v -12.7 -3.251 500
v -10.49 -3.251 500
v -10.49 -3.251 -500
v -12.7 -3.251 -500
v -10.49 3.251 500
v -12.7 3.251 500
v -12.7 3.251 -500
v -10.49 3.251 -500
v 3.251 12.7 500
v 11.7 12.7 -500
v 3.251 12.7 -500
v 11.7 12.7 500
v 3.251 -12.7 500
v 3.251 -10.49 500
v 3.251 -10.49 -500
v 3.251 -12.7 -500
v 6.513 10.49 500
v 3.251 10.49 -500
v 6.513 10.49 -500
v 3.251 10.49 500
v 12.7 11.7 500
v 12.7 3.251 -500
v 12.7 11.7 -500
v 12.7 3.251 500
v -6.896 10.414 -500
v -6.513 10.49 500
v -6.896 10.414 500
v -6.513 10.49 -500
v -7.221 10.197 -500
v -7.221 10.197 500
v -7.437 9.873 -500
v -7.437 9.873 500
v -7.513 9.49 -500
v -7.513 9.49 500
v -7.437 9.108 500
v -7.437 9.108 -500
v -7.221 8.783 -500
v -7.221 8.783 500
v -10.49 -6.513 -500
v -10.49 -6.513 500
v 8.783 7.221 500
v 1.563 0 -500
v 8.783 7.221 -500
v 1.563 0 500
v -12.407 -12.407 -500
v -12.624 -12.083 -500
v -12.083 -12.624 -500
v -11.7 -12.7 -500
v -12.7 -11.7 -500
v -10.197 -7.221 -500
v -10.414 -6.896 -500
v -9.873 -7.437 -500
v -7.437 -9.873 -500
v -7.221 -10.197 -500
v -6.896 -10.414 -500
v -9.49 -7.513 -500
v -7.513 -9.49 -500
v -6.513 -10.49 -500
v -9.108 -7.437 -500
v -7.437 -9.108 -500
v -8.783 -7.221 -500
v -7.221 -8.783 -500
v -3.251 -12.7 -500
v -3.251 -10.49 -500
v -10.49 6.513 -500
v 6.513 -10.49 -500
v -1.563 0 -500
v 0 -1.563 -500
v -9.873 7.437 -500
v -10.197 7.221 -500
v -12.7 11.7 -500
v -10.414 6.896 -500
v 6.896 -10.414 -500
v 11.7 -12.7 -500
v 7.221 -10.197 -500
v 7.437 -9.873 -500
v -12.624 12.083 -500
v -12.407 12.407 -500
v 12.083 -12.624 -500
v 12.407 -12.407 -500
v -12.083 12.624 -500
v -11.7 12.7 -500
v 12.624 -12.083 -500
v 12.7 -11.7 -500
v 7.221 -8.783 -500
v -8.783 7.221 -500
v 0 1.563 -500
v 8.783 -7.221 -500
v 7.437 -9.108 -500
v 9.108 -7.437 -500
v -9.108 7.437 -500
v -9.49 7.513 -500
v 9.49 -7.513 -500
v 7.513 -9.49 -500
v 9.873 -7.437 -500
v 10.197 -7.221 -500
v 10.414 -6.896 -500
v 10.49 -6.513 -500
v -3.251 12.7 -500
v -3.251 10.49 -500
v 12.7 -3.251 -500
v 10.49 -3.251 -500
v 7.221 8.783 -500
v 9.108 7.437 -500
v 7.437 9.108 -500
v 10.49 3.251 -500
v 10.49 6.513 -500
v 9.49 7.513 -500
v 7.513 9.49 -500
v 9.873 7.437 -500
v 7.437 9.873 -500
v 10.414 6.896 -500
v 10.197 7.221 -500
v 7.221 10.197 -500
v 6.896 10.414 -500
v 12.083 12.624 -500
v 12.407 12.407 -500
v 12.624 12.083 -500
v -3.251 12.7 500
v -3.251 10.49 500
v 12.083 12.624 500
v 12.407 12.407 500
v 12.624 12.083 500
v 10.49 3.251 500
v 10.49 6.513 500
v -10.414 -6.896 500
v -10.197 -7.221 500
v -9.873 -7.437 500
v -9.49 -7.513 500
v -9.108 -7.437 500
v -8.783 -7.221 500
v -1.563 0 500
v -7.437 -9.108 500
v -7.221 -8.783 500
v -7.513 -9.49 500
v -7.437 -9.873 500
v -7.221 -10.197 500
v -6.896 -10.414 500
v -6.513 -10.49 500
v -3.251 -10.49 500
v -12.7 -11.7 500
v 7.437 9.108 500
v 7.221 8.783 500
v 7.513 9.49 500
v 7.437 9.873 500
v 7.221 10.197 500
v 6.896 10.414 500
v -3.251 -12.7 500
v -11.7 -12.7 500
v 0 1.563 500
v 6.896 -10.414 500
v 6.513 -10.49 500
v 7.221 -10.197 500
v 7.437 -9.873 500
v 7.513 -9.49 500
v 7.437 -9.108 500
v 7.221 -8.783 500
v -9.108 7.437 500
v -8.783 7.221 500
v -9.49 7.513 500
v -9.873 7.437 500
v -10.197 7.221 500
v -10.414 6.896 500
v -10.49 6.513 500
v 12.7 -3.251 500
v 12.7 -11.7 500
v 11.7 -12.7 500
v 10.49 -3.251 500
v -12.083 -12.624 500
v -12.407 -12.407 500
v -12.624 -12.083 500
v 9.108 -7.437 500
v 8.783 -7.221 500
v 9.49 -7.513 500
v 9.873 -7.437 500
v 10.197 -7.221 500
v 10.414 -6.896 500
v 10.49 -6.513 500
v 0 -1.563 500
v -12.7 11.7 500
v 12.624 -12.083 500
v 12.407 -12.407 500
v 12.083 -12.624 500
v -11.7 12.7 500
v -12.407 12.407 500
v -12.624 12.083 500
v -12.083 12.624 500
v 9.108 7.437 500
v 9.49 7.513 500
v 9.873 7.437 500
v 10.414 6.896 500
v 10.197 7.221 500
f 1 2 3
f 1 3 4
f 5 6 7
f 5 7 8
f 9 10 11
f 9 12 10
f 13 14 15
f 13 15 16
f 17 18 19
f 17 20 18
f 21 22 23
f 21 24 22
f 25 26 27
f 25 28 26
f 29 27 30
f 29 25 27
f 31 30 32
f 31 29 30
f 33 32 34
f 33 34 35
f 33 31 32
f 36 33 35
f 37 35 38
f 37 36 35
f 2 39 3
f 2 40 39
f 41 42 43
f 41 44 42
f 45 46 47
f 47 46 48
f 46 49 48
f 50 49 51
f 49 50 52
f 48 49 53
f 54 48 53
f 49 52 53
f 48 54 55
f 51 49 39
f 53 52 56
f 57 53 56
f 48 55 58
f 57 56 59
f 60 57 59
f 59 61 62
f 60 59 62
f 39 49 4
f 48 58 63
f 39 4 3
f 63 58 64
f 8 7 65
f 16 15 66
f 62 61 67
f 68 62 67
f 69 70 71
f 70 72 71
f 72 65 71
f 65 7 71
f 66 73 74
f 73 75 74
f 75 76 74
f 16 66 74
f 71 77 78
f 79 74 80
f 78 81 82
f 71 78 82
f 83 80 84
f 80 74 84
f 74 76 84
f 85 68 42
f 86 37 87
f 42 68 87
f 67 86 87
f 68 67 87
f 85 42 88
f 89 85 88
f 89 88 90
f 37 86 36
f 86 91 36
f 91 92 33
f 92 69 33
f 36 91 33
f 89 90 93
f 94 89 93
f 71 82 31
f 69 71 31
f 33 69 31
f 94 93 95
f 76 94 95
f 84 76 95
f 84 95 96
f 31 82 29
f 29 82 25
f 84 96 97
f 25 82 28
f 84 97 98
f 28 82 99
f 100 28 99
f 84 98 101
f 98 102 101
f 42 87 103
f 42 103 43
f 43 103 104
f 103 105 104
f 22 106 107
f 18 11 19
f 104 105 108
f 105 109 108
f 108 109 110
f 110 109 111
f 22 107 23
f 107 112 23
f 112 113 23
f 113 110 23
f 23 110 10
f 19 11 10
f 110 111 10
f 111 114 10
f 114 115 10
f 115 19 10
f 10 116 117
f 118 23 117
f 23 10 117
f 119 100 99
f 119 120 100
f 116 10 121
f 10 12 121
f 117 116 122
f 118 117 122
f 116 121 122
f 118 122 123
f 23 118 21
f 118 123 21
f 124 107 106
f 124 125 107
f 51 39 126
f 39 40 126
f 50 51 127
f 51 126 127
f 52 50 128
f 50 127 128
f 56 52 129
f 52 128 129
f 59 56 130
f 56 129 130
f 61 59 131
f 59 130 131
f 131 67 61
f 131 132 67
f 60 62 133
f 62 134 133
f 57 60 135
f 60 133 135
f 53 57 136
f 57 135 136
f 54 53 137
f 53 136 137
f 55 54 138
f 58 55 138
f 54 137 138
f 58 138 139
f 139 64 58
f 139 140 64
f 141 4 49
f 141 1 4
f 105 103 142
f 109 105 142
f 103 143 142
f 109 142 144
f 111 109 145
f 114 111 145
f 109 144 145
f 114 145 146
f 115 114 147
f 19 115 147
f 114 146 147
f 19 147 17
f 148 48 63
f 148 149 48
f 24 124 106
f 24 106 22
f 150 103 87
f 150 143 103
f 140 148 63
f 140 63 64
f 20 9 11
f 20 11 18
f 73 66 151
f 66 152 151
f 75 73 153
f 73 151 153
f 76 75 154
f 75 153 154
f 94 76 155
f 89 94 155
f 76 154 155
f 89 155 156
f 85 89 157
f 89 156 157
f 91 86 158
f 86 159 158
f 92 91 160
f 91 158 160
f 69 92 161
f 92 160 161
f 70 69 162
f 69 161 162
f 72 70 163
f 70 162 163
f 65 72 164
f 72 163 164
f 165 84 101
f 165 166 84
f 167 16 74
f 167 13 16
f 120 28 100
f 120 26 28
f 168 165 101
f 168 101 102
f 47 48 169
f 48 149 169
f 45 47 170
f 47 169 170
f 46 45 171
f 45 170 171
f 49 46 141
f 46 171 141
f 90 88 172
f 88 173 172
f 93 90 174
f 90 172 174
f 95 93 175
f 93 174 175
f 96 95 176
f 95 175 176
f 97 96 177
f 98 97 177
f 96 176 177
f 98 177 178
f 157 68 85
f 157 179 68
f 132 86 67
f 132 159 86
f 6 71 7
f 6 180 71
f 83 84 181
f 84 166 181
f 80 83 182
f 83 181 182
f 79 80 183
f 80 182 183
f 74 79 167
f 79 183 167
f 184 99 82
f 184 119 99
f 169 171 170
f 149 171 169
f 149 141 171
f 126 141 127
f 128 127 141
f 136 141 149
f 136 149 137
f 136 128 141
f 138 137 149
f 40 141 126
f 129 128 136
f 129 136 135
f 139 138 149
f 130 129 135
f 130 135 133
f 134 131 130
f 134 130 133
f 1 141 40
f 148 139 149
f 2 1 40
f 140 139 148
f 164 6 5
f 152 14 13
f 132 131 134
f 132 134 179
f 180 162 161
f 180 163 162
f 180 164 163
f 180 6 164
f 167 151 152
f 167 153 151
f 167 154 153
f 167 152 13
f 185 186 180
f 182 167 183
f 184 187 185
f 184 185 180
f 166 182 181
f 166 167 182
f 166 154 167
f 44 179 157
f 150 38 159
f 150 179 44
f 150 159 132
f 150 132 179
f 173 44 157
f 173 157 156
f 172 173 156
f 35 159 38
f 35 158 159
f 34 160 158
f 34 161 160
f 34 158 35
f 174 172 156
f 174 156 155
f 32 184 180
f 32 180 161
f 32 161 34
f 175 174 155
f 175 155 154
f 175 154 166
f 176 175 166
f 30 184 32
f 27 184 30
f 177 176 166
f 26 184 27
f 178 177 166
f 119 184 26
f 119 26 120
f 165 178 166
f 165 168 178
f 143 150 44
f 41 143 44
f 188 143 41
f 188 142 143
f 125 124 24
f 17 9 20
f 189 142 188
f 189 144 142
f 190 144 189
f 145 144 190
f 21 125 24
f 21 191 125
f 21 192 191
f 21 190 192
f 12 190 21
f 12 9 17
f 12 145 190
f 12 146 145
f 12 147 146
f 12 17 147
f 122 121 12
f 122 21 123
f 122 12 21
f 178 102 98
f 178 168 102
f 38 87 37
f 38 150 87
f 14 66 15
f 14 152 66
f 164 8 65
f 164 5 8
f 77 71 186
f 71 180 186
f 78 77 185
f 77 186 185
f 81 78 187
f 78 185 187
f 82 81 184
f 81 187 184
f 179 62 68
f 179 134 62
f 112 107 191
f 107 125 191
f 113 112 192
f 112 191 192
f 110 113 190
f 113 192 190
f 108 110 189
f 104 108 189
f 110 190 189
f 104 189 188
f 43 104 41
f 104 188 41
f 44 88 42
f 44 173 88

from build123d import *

# Parameters (mm, degrees)
BOSS_EXTRUDE1_DEPTH = 500
FILLET1_R           = 1


with BuildPart() as part:
    # Sketch1 → Boss-Extrude1 (new body, symmetric)
    with BuildSketch(Plane.XY):
        Polygon((-3.2512, 10.4902), (-3.2512, 12.7), (-12.7, 12.7), (-12.7, 3.2512), (-10.4902, 3.2512), (-10.4902, 8.927635435), (-1.562564565, 0), (-10.4902, -8.927635435), (-10.4902, -3.2512), (-12.7, -3.2512), (-12.7, -12.7), (-3.2512, -12.7), (-3.2512, -10.4902), (-8.927635435, -10.4902), (0, -1.562564565), (8.927635435, -10.4902), (3.2512, -10.4902), (3.2512, -12.7), (12.7, -12.7), (12.7, -3.2512), (10.4902, -3.2512), (10.4902, -8.927635435), (1.562564565, 0), (10.4902, 8.927635435), (10.4902, 3.2512), (12.7, 3.2512), (12.7, 12.7), (3.2512, 12.7), (3.2512, 10.4902), (8.927635435, 10.4902), (0, 1.562564565), (-8.927635435, 10.4902), align=None)
    extrude(amount=BOSS_EXTRUDE1_DEPTH, both=True)

    # Fillet1
    fillet1_edges = [part.edges().sort_by_distance(p)[0] for p in [
        (-10.4902, 8.927635435, 0),
        (-12.7, 12.7, 0),
        (-8.927635435, 10.4902, 0),
        (8.927635435, 10.4902, 0),
        (12.7, 12.7, 0),
        (10.4902, 8.927635435, 0),
        (10.4902, -8.927635435, 0),
        (12.7, -12.7, 0),
        (8.927635435, -10.4902, 0),
        (-8.927635435, -10.4902, 0),
        (-12.7, -12.7, 0),
        (-10.4902, -8.927635435, 0),
    ]]
    fillet(fillet1_edges, radius=FILLET1_R)


solid = part.part
